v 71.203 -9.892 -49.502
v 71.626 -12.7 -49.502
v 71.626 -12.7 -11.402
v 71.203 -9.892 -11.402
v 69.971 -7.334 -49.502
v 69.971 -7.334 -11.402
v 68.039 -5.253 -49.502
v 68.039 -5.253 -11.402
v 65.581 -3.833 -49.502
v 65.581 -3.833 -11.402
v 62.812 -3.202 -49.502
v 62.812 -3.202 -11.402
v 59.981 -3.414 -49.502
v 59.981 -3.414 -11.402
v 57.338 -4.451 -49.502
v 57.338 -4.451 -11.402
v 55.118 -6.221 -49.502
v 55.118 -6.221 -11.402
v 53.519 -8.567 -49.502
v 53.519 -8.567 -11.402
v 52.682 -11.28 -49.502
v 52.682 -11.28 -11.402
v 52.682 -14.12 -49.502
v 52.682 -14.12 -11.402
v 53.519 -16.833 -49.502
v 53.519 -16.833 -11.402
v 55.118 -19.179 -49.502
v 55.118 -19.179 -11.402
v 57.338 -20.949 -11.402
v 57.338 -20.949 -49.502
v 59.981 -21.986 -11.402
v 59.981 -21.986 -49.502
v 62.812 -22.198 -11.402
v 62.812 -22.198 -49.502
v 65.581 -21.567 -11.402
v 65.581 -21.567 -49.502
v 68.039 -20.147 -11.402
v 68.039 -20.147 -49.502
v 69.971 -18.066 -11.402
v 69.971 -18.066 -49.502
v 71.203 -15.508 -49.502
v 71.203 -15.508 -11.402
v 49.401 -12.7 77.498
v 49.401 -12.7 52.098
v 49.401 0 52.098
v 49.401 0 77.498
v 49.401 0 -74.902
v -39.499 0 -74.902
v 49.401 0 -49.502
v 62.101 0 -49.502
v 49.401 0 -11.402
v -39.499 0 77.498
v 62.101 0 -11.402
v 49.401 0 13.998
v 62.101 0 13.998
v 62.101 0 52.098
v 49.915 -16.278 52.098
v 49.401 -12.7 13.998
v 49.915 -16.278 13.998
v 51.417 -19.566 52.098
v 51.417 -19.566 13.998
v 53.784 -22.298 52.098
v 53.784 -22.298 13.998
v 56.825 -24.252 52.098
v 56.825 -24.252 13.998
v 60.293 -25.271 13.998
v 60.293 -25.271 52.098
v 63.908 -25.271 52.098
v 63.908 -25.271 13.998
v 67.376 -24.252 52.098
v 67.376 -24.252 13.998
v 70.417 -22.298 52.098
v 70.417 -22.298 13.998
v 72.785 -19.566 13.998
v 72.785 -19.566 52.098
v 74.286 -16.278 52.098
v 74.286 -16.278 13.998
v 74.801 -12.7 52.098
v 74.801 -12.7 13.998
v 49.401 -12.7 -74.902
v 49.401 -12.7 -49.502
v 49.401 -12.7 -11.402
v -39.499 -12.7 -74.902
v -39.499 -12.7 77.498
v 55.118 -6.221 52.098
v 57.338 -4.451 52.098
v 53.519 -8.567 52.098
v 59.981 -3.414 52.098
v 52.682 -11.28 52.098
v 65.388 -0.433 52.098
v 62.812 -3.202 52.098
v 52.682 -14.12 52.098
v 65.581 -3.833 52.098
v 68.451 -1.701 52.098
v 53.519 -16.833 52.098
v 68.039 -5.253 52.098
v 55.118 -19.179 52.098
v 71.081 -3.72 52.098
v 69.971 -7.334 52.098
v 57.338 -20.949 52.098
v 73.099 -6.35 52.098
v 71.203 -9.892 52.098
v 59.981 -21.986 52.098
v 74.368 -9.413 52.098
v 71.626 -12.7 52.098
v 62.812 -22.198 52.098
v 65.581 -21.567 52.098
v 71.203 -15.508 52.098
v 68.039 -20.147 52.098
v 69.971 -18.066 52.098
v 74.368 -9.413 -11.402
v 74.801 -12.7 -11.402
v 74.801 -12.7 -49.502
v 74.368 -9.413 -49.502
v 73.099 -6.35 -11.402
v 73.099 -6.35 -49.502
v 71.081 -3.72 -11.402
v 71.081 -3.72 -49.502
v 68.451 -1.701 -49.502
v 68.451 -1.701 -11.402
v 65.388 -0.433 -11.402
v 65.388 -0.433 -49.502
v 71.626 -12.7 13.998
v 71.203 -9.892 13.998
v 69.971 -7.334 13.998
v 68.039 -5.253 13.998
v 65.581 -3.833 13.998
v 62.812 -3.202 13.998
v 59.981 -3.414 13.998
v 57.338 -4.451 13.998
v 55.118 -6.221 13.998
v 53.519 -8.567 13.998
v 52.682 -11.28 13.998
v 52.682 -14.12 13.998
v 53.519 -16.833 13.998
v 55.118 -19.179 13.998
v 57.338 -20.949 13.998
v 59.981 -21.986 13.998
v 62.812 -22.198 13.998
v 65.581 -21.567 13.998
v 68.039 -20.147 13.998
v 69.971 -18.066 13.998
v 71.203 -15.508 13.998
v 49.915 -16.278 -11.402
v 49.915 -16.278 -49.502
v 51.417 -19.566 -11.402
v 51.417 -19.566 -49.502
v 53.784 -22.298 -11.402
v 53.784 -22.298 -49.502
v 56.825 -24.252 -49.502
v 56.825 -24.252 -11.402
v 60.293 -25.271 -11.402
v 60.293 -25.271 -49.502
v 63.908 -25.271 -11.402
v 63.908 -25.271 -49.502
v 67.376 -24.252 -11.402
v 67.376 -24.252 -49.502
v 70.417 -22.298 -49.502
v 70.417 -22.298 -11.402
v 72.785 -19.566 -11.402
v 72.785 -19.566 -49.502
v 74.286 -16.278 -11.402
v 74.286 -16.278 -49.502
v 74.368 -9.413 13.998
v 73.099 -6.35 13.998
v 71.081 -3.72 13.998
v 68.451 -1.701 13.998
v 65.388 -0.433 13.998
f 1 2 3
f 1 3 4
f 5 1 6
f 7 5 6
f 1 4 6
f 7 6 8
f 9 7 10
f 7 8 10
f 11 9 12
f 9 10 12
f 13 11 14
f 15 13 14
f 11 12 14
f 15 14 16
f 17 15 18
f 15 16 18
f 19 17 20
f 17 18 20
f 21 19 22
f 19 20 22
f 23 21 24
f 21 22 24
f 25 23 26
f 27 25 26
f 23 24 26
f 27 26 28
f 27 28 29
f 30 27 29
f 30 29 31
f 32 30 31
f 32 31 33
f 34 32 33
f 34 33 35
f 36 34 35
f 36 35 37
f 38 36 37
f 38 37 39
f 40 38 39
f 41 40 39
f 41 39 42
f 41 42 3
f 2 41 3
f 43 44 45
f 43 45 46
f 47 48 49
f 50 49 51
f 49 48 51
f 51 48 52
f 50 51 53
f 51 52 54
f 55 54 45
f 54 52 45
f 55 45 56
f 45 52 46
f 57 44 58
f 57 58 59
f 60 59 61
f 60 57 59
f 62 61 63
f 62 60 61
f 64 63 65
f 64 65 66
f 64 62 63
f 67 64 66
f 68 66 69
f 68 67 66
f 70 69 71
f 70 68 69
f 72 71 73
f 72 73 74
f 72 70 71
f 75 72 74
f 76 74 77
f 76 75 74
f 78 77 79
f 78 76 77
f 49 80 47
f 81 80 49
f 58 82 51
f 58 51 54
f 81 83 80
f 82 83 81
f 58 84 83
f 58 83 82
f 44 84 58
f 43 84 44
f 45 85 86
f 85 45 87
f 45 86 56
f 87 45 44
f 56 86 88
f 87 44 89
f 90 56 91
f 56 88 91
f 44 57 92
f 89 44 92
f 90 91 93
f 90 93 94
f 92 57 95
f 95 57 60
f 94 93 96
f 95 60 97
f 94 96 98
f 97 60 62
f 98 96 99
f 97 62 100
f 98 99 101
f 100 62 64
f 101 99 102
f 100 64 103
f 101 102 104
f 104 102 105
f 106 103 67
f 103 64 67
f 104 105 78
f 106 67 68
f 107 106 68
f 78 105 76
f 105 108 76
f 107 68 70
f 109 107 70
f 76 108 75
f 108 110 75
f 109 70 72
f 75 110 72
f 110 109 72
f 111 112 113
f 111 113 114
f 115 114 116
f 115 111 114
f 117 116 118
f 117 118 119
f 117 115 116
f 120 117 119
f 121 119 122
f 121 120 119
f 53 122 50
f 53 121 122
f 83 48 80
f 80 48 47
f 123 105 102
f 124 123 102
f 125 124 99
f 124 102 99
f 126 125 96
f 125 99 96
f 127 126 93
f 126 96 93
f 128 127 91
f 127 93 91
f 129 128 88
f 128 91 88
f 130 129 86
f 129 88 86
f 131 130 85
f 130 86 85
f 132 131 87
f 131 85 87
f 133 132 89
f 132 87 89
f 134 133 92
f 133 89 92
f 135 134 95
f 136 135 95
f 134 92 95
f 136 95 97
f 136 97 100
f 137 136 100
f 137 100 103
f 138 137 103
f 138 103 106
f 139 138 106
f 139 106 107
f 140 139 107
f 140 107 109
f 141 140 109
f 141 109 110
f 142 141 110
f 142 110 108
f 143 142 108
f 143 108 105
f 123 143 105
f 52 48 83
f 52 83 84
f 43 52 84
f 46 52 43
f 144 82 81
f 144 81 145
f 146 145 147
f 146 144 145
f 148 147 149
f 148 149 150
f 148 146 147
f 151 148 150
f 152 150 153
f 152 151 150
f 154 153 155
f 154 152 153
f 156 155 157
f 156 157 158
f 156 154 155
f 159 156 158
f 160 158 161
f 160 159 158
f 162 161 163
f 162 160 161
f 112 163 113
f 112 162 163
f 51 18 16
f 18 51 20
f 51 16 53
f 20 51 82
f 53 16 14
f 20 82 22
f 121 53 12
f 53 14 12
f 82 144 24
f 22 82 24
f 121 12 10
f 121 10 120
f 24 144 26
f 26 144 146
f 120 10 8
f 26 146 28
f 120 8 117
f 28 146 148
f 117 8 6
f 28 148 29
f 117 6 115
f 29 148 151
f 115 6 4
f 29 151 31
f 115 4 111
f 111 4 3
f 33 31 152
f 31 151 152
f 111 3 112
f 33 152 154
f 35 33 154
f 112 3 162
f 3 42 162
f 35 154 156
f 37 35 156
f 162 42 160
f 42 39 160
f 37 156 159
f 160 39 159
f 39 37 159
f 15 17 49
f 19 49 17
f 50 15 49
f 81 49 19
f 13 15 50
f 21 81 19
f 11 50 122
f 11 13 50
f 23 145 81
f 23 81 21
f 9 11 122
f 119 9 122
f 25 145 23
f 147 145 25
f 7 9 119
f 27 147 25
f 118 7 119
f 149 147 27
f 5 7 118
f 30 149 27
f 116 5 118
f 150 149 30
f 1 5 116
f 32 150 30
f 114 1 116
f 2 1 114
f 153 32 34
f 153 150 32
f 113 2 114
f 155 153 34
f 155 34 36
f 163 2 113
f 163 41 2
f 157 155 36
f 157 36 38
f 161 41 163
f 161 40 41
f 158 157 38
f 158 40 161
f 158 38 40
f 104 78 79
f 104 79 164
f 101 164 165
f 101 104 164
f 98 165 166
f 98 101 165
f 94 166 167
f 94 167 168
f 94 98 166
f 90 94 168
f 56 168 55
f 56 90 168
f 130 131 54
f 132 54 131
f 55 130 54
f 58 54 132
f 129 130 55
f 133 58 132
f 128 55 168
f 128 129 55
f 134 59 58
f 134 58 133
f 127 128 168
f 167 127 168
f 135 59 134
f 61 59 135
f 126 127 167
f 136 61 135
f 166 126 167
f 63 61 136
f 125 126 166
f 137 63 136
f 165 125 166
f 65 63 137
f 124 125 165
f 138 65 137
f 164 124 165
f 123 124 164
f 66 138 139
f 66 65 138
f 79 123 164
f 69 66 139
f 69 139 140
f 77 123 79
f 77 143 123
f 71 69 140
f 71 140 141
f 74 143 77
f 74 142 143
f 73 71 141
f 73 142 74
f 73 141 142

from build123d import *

# Parameters (mm, degrees)
F0_W     = 101.6
F0_H     = 152.4
F1_DEPTH = 12.7
F3_DEPTH = 152.4
F4_R     = 9.525
F5_DEPTH = 152.4
F7_W     = 50.8
F7_H     = 25.4
F8_DEPTH = 50.8


# Not quite as in the source:
# - a feature names something its author has since deleted; it is built from what else it names


with BuildPart() as f1:
    # F0 (on Front) → F1 (new body)
    with BuildSketch(Plane.XZ):
        with Locations((11.3006858155, 1.2977712616)):
            Rectangle(F0_W, F0_H)
    extrude(amount=F1_DEPTH)

    # F2 (on face) → F3 (join)
    with BuildSketch(Plane.XY.offset(77.4977712616)):
        with BuildLine():
            ThreePointArc((49.4006858155, -12.7), (62.1006858155, -25.4), (74.8006858155, -12.7))
            ThreePointArc((74.8006858155, -12.7), (71.0809419366, -3.7197438789), (62.1006858155, 0))
            Line((62.1006858155, 0), (62.1006858155, -12.7))
            Line((62.1006858155, -12.7), (49.4006858155, -12.7))
        make_face()
    extrude(amount=-F3_DEPTH)

    # F4 (on face) → F5 (cut, through all)
    with BuildSketch(Plane.XY.offset(77.4977712616)):
        with Locations((62.1006858155, -12.7)):
            Circle(F4_R)
    extrude(amount=-F5_DEPTH, mode=Mode.SUBTRACT)

    # F7 (on offset) → F8 (cut)
    with BuildSketch(Plane.XZ.offset(25.4)):
        with Locations((74.8006858155, 64.7977712616)):
            Rectangle(F7_W, F7_H)
        with Locations((74.8006858155, -62.2022287384)):
            Rectangle(F7_W, F7_H)
        with Locations((74.8006858155, 1.2977712616)):
            Rectangle(F7_W, F7_H)
    extrude(amount=-F8_DEPTH, mode=Mode.SUBTRACT)


solid = f1.part
